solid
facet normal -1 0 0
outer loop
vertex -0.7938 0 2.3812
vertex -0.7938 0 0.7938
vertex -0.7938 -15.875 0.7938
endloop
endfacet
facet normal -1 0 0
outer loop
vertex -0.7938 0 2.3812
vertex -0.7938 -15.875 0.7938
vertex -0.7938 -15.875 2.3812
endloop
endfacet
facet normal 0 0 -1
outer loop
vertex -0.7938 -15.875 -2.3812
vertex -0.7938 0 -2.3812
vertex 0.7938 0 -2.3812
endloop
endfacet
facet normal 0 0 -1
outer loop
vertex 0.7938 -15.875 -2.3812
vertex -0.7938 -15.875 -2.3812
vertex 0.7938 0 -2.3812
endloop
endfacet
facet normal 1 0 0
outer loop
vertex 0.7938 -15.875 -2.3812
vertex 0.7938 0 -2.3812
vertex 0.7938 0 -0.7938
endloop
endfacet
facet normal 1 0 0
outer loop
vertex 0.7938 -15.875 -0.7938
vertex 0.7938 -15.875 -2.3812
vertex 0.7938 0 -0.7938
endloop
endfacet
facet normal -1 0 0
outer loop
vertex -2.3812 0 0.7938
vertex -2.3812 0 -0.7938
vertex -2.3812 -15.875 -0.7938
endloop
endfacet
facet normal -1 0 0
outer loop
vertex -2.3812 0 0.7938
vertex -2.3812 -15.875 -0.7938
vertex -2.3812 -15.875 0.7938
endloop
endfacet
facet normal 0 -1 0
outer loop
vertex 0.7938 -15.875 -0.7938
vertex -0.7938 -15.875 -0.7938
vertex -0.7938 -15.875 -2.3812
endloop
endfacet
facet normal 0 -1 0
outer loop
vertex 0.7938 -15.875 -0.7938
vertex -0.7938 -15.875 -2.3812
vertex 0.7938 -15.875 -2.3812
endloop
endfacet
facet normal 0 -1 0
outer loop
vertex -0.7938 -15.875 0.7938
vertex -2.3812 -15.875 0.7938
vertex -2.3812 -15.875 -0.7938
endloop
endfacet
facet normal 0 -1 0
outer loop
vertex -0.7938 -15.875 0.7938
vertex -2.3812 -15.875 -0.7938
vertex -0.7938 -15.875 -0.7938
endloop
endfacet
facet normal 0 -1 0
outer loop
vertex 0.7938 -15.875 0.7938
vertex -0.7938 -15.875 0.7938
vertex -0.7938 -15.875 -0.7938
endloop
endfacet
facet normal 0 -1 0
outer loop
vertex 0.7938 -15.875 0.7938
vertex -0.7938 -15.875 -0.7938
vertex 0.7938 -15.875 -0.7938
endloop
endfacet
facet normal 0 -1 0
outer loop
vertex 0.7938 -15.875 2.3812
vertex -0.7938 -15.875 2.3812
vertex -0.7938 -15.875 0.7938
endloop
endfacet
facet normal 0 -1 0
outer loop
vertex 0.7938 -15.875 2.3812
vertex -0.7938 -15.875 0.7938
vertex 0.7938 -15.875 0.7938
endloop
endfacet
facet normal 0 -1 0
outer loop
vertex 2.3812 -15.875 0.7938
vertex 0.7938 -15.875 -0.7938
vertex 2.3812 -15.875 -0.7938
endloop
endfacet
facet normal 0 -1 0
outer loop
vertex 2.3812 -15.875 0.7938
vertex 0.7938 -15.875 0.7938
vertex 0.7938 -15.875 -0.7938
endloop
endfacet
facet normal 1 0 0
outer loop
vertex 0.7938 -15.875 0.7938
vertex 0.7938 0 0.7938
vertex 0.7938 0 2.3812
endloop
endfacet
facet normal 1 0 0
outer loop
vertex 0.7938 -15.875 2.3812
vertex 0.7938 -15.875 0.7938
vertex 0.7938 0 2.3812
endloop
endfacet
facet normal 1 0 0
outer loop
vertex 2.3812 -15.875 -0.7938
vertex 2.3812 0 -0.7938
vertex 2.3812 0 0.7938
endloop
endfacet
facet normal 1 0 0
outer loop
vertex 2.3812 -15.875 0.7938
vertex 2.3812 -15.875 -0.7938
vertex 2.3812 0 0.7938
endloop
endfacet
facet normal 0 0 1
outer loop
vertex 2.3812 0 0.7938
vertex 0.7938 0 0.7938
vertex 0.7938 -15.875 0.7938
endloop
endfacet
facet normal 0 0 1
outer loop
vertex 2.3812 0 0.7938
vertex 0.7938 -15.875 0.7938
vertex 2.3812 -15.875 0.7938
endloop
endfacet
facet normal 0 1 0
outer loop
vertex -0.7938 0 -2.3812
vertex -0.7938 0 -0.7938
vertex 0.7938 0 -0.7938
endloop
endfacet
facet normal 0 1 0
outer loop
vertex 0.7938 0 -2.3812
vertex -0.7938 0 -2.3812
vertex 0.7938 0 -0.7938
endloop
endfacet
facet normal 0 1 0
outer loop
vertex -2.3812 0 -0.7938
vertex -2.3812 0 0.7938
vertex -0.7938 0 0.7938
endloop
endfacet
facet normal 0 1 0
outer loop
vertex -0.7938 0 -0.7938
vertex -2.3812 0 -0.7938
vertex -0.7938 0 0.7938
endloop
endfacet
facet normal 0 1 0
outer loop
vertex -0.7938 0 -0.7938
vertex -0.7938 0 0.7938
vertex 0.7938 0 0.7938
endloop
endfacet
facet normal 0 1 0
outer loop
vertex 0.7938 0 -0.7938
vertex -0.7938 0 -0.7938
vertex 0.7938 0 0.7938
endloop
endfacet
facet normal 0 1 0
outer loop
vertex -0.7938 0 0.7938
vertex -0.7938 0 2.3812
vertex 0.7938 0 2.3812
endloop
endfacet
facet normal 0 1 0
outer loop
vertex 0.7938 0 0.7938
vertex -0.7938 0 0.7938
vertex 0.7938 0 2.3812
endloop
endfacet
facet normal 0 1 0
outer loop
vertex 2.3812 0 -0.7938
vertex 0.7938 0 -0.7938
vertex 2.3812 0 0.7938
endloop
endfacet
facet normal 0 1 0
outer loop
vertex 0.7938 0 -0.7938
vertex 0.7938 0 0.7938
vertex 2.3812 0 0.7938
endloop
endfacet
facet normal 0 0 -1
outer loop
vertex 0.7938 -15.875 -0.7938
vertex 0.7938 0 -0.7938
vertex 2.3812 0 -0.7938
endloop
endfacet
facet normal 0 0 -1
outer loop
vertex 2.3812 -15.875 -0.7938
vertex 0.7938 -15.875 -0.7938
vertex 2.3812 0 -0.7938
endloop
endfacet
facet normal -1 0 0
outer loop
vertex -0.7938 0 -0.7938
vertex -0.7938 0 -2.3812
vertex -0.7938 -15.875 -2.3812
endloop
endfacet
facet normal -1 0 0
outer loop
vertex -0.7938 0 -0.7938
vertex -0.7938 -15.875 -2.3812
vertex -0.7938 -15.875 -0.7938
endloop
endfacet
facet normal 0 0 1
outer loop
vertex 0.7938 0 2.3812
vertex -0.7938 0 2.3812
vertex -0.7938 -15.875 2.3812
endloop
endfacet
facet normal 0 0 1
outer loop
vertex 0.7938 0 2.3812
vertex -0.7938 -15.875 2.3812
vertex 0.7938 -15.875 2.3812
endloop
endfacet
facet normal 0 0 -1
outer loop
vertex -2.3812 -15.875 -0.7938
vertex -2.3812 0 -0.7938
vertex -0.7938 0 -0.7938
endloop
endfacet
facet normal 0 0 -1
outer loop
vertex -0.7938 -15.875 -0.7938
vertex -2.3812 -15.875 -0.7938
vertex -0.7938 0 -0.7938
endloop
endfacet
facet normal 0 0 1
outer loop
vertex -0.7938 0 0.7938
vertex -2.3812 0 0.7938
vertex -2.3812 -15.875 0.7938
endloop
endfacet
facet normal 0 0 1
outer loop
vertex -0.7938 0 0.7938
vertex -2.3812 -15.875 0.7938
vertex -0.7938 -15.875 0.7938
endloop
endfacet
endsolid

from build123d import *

# Parameters (mm, degrees)
F0_W     = 1.5875
F0_H     = 1.5875
F1_DEPTH = 15.875


with BuildPart() as f1:
    # F0 (on Front) → F1 (new body)
    with BuildSketch(Plane.XZ):
        with Locations((-1.5875, 0)):
            Rectangle(F0_W, F0_H)
        with Locations((0, 1.5875)):
            Rectangle(F0_W, F0_H)
        Rectangle(F0_W, F0_H)
        with Locations((1.5875, 0)):
            Rectangle(F0_W, F0_H)
        with Locations((0, -1.5875)):
            Rectangle(F0_W, F0_H)
    extrude(amount=F1_DEPTH)


solid = f1.part
